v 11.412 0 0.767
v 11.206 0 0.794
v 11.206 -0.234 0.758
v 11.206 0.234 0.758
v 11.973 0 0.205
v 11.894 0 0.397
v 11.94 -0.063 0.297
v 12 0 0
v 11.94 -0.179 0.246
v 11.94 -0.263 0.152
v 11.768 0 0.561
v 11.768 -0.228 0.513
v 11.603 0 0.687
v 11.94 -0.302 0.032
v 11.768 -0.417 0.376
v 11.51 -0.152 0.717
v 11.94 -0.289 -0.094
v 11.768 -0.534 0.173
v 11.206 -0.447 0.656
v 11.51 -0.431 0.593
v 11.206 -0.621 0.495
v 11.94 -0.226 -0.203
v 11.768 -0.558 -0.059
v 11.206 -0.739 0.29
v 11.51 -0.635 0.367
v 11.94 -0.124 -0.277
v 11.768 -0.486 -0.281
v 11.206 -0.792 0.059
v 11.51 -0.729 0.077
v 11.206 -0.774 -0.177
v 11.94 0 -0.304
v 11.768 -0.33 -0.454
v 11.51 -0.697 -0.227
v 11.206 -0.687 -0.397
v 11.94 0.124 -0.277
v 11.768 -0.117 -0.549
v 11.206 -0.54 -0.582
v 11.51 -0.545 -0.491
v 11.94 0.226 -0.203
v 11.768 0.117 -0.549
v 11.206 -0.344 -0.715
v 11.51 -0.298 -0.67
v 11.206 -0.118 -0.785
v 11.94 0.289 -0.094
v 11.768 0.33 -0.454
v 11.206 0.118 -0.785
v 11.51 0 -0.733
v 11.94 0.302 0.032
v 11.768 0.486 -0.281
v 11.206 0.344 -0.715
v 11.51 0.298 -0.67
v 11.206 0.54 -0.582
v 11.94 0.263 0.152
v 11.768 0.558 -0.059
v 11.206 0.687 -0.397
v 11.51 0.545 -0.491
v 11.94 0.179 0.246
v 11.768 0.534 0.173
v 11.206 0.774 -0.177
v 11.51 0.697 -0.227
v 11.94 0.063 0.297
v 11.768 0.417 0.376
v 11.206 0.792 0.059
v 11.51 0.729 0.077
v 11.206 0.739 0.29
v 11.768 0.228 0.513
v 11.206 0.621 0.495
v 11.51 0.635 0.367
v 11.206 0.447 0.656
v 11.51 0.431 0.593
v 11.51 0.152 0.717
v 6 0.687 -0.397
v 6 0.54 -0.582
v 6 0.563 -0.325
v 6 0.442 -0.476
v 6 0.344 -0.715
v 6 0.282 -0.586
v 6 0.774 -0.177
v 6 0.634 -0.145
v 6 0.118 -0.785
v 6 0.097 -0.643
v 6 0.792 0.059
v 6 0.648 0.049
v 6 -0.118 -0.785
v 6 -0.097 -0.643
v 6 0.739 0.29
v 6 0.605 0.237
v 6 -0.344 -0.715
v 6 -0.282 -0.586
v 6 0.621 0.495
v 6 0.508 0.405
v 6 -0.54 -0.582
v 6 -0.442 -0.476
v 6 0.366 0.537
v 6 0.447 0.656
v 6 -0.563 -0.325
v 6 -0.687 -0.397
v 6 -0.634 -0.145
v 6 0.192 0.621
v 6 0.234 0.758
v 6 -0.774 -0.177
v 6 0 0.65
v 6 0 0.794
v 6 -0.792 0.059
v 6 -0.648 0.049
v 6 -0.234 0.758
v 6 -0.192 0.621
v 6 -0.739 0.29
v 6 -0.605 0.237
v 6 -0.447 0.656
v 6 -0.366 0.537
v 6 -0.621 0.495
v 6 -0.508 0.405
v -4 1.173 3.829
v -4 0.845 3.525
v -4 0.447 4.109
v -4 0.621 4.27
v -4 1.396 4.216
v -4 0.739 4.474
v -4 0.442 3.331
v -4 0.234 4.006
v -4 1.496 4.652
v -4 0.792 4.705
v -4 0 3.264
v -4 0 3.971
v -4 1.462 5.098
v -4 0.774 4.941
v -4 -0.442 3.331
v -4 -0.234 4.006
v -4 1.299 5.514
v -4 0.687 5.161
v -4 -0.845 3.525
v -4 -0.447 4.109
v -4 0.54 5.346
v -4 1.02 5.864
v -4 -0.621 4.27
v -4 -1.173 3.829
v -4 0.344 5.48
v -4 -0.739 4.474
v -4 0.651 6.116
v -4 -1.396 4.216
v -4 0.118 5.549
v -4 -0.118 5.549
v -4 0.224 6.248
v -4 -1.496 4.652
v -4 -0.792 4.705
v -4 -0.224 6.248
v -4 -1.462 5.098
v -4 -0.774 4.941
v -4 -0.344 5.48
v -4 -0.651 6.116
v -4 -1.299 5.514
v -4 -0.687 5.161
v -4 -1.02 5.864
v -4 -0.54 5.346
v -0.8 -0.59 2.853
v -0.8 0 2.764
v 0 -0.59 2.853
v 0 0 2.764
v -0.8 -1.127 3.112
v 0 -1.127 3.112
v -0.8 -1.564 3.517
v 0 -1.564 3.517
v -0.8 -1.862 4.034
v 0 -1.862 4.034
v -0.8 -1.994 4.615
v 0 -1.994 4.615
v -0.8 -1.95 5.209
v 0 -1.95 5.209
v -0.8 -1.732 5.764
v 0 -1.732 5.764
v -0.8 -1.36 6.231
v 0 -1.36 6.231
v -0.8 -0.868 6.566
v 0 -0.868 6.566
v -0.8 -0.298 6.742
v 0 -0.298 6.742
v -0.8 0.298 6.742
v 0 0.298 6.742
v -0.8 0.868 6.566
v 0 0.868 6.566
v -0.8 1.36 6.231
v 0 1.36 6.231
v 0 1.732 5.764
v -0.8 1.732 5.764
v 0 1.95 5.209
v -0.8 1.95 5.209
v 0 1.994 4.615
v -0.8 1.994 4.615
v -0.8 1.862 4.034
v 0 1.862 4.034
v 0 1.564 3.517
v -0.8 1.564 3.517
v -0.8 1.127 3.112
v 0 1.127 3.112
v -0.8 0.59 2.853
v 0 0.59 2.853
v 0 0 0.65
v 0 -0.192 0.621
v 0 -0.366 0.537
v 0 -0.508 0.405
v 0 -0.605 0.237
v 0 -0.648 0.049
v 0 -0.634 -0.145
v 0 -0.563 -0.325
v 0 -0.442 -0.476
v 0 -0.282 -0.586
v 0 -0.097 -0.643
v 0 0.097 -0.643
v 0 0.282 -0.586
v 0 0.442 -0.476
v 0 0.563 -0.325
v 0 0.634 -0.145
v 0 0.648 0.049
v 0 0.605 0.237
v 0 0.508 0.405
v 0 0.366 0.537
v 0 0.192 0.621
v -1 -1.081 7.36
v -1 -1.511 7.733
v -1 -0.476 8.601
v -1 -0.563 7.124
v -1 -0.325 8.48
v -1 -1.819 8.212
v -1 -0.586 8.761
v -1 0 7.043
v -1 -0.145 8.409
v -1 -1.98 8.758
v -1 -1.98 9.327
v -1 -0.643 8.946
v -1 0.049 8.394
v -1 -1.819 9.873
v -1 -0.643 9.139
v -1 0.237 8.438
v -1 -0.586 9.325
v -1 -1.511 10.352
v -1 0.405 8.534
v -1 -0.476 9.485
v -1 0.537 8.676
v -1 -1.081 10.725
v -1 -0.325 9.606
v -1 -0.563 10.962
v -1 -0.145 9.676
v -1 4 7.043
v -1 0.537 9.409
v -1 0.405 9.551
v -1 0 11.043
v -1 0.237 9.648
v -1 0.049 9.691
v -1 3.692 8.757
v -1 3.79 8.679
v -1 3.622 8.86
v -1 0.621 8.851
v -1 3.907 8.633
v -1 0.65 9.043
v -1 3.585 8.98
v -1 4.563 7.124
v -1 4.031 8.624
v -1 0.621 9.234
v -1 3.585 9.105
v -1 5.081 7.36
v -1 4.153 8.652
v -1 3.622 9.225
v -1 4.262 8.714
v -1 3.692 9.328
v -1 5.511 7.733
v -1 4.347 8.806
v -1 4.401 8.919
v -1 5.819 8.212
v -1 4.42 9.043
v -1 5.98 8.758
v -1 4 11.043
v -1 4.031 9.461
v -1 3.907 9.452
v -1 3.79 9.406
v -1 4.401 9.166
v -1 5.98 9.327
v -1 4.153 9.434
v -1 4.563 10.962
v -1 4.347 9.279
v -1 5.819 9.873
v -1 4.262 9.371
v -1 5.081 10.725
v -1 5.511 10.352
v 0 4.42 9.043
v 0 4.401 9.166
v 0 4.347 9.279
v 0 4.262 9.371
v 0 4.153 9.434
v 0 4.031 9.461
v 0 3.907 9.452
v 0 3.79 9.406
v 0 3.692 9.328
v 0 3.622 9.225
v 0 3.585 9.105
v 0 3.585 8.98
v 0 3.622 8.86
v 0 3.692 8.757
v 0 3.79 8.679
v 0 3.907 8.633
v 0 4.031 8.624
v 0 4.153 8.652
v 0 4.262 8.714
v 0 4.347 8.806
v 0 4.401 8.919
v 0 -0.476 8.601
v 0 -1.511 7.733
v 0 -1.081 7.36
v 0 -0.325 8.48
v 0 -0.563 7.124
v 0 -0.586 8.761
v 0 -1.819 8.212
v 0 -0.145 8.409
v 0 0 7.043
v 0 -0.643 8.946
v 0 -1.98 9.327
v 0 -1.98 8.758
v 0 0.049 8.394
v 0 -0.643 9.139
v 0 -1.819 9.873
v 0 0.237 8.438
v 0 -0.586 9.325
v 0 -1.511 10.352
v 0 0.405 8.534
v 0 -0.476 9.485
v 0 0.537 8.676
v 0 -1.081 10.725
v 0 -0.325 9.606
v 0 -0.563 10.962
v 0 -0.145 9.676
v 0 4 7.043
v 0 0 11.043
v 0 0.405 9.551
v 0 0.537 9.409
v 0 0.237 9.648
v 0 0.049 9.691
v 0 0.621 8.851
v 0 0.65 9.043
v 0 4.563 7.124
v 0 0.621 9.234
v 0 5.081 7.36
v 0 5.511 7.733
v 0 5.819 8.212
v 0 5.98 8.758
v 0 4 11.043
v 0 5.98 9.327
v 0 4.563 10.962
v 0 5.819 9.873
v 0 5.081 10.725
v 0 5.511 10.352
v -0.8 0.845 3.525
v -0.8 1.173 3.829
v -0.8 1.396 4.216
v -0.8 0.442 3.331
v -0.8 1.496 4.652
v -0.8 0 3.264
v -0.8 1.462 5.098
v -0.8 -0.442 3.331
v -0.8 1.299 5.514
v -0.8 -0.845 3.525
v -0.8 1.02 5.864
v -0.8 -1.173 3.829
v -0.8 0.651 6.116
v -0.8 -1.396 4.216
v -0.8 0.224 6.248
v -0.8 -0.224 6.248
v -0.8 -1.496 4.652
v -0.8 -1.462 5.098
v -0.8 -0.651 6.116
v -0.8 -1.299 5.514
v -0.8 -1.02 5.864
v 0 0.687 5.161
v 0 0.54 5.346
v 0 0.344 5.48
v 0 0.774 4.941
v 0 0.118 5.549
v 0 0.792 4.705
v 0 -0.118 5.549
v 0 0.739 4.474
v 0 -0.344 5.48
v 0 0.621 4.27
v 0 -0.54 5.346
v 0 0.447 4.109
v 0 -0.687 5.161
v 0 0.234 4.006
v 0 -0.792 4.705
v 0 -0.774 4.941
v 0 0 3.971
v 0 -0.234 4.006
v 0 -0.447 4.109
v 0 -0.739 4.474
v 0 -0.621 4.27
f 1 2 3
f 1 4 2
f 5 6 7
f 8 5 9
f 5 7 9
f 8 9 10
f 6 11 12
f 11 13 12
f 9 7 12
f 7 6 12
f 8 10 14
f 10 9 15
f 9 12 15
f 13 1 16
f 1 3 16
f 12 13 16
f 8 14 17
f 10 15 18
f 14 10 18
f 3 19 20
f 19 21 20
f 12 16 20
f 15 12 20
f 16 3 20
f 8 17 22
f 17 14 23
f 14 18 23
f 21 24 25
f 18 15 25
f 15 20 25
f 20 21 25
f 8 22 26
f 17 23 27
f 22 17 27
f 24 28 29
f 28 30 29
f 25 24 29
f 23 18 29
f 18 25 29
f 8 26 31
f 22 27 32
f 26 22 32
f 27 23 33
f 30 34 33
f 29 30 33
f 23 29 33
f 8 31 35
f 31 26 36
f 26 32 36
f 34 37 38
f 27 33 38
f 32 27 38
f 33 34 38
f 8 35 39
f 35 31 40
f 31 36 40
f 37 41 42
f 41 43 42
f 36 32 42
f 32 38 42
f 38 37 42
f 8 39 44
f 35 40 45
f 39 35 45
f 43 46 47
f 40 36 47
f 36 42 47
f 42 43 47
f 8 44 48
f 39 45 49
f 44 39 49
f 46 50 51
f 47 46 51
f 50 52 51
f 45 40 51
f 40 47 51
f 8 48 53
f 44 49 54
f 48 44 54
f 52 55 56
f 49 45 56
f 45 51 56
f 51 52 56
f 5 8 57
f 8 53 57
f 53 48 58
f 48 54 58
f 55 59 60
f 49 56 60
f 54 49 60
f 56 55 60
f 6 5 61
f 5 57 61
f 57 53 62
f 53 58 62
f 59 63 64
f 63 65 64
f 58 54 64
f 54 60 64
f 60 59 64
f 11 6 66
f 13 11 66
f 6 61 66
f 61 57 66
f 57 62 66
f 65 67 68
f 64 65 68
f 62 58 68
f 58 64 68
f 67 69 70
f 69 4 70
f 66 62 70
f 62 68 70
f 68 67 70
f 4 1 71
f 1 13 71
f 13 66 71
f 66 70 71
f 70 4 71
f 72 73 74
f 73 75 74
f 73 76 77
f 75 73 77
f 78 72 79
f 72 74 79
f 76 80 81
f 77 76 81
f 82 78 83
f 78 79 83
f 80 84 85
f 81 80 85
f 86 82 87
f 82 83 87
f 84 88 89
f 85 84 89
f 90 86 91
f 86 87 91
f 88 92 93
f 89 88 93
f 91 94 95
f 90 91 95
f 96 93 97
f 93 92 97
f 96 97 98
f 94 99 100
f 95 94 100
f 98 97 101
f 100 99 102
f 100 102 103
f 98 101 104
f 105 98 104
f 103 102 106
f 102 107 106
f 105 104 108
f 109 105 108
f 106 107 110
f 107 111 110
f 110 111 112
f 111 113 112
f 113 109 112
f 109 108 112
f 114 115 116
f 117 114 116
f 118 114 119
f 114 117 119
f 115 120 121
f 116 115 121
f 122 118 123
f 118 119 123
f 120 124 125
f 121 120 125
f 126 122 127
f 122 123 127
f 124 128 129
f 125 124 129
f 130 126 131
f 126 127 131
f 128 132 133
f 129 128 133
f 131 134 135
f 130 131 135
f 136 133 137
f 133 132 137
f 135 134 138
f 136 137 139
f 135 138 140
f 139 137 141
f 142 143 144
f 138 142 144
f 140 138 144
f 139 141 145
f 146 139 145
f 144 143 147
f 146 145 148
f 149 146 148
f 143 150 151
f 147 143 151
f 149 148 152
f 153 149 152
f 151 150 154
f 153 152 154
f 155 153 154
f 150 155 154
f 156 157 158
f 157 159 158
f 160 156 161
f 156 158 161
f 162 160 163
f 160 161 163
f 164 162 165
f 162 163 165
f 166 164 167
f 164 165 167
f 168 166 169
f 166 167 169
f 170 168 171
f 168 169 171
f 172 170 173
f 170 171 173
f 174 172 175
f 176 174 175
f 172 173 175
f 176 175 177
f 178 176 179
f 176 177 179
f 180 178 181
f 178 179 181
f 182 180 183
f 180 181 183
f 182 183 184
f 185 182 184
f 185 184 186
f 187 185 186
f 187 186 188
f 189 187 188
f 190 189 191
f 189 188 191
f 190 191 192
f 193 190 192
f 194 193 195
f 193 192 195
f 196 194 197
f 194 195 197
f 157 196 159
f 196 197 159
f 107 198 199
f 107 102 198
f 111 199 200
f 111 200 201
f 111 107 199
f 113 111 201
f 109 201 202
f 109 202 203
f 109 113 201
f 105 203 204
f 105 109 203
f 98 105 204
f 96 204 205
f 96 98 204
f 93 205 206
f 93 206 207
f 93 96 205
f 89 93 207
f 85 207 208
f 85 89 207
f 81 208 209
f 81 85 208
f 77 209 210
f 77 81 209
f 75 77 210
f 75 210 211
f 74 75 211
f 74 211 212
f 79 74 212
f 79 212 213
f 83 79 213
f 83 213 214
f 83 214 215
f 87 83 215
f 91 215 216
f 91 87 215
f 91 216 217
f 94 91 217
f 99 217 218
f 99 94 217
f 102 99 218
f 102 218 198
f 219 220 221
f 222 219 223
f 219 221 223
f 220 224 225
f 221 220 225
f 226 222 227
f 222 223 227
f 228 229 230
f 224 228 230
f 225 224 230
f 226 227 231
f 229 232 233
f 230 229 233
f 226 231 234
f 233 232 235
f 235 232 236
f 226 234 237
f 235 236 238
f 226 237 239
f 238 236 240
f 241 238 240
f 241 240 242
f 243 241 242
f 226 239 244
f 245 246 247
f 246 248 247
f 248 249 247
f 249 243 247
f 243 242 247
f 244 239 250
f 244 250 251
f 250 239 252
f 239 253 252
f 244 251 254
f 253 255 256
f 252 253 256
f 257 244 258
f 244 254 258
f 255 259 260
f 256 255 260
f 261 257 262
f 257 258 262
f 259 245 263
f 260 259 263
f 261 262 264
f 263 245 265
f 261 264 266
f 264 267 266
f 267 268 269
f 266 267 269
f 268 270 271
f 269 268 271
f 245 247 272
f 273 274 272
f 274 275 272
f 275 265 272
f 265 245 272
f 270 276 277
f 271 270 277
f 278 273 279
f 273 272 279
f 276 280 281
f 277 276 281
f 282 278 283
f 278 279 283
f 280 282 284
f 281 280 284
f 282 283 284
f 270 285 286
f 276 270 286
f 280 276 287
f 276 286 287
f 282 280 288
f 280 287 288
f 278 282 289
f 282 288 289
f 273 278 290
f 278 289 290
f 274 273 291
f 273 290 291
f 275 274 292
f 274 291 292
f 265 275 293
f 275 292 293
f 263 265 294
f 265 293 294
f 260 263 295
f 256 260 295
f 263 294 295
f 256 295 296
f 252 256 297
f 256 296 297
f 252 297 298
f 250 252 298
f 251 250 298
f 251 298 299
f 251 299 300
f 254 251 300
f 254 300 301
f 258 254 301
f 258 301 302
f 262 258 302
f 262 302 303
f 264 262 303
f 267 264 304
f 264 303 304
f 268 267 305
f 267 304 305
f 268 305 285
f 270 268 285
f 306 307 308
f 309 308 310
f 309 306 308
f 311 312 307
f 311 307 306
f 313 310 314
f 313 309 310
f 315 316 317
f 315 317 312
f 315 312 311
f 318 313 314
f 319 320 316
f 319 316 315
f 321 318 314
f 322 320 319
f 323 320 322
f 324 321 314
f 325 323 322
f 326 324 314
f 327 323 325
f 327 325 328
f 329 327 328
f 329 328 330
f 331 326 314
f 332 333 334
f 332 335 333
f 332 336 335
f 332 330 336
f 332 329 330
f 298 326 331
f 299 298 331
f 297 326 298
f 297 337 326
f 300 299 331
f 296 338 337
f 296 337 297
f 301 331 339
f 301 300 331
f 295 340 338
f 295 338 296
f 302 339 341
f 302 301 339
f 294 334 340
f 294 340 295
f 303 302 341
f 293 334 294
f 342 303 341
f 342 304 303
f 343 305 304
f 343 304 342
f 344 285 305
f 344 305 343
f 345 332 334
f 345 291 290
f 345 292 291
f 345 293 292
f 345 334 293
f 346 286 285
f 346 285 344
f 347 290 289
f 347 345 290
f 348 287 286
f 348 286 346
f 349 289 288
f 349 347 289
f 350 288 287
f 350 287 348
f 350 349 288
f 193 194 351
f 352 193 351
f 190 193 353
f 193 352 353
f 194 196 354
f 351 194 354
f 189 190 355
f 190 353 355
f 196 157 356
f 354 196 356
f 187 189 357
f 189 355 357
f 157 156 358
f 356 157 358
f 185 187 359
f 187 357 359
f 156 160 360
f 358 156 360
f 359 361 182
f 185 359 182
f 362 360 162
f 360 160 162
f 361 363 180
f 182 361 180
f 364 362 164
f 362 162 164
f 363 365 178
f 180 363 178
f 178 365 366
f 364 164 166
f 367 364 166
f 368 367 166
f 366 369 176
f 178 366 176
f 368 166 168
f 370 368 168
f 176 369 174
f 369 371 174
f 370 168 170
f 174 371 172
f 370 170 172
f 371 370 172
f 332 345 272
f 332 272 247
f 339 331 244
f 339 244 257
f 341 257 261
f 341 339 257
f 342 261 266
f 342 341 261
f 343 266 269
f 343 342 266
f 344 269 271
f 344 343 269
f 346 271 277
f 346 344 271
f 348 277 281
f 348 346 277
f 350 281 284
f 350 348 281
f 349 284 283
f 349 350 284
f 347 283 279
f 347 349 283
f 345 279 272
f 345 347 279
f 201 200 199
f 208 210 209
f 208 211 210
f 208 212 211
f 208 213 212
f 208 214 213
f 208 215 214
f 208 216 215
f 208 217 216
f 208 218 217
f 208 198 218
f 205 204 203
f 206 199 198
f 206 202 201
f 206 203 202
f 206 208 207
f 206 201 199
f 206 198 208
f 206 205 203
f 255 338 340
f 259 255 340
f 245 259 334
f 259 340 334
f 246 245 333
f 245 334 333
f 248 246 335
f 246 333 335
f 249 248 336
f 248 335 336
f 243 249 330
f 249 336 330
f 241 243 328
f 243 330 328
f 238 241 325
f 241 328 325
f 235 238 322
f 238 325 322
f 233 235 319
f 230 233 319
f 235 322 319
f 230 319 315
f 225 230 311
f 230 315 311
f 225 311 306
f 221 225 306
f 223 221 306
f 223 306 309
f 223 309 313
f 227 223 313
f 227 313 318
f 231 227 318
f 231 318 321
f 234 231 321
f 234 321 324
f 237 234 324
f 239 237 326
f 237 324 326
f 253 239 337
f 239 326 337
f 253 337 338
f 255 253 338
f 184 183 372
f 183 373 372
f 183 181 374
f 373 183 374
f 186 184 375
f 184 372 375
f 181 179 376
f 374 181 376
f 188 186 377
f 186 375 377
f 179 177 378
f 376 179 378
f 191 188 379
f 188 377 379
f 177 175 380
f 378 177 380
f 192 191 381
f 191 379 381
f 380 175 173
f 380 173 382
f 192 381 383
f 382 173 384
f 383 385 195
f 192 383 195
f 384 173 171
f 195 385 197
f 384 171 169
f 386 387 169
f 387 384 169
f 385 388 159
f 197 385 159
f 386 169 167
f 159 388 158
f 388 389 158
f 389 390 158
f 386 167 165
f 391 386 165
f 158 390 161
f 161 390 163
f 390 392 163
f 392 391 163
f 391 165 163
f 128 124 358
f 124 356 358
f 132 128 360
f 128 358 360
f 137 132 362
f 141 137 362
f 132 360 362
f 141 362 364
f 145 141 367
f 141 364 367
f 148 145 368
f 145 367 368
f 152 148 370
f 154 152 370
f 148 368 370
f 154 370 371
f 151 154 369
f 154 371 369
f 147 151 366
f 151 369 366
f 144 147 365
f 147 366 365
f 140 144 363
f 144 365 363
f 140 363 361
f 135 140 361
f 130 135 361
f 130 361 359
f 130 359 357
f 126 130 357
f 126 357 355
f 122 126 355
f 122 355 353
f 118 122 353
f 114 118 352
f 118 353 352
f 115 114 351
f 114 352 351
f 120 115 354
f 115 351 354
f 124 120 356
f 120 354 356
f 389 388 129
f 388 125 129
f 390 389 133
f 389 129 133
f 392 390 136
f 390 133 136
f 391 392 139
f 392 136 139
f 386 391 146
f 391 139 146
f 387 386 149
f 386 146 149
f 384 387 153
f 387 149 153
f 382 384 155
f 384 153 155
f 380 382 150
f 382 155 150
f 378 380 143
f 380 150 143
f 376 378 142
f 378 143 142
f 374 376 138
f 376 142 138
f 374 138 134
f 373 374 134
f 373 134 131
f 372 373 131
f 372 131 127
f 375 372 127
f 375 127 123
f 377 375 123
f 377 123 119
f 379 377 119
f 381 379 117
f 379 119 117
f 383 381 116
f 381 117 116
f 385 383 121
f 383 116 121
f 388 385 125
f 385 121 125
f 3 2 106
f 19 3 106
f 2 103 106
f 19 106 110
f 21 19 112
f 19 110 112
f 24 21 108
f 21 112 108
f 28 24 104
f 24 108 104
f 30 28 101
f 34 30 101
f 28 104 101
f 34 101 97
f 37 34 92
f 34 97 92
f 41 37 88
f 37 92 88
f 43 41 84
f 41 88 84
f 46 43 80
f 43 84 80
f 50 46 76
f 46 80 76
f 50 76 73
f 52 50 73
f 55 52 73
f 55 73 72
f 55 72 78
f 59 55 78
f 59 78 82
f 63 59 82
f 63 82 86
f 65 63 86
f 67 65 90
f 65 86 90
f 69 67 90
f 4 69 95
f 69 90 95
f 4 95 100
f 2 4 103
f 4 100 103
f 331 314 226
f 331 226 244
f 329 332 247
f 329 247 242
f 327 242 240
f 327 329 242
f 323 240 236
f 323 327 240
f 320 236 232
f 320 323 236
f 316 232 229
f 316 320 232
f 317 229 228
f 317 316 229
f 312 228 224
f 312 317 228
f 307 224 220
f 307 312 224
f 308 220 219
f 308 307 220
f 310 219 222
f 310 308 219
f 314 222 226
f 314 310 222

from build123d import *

# Parameters (mm, degrees)
F0_W     = 6
F0_H     = 0.65
F4_R     = 0.65
F4_R_2   = 0.42
F5_DEPTH = 1


with BuildPart() as f1:
    # F0 (on Front) → F1 (revolve)
    with BuildSketch(Plane.XZ):
        with Locations((3, 0.325)):
            Rectangle(F0_W, F0_H)
        with BuildLine():
            Line((6, 0.65), (6, 0))
            Line((6, 0), (12, 0))
            ThreePointArc((12, 0), (11.767516, 0.561266), (11.20625, 0.79375))
            Line((11.20625, 0.79375), (6, 0.79375))
            Line((6, 0.79375), (6, 0.65))
        make_face()
    revolve(axis=Axis((3, 0, 0), (1, 0, 0)))


with BuildPart() as f3:
    # F2 (on Front) → F3 (revolve)
    with BuildSketch(Plane.XZ):
        Polygon((-0.8, 2.764438), (0, 2.764438), (0, 3.970688), (-4, 3.970688), (-4, 3.264438), (-0.8, 3.264438), align=None)
    revolve(axis=Axis((-2.4, 0, 4.764438), (-1, 0, 0)))


with BuildPart() as f5:
    # F4 (on Right) → F5 (new body)
    with BuildSketch(Plane.YZ):
        with BuildLine():
            Line((4, 11.042616), (0, 11.042616))
            ThreePointArc((0, 11.042616), (-2, 9.042616), (0, 7.042616))
            Line((0, 7.042616), (4, 7.042616))
            ThreePointArc((4, 7.042616), (6, 9.042616), (4, 11.042616))
        make_face()
        with Locations((0, 9.042616)):
            Circle(F4_R, mode=Mode.SUBTRACT)
        with Locations((4, 9.042616)):
            Circle(F4_R_2, mode=Mode.SUBTRACT)
    extrude(amount=-F5_DEPTH)


solid = Compound([f1.part, f3.part, f5.part])
